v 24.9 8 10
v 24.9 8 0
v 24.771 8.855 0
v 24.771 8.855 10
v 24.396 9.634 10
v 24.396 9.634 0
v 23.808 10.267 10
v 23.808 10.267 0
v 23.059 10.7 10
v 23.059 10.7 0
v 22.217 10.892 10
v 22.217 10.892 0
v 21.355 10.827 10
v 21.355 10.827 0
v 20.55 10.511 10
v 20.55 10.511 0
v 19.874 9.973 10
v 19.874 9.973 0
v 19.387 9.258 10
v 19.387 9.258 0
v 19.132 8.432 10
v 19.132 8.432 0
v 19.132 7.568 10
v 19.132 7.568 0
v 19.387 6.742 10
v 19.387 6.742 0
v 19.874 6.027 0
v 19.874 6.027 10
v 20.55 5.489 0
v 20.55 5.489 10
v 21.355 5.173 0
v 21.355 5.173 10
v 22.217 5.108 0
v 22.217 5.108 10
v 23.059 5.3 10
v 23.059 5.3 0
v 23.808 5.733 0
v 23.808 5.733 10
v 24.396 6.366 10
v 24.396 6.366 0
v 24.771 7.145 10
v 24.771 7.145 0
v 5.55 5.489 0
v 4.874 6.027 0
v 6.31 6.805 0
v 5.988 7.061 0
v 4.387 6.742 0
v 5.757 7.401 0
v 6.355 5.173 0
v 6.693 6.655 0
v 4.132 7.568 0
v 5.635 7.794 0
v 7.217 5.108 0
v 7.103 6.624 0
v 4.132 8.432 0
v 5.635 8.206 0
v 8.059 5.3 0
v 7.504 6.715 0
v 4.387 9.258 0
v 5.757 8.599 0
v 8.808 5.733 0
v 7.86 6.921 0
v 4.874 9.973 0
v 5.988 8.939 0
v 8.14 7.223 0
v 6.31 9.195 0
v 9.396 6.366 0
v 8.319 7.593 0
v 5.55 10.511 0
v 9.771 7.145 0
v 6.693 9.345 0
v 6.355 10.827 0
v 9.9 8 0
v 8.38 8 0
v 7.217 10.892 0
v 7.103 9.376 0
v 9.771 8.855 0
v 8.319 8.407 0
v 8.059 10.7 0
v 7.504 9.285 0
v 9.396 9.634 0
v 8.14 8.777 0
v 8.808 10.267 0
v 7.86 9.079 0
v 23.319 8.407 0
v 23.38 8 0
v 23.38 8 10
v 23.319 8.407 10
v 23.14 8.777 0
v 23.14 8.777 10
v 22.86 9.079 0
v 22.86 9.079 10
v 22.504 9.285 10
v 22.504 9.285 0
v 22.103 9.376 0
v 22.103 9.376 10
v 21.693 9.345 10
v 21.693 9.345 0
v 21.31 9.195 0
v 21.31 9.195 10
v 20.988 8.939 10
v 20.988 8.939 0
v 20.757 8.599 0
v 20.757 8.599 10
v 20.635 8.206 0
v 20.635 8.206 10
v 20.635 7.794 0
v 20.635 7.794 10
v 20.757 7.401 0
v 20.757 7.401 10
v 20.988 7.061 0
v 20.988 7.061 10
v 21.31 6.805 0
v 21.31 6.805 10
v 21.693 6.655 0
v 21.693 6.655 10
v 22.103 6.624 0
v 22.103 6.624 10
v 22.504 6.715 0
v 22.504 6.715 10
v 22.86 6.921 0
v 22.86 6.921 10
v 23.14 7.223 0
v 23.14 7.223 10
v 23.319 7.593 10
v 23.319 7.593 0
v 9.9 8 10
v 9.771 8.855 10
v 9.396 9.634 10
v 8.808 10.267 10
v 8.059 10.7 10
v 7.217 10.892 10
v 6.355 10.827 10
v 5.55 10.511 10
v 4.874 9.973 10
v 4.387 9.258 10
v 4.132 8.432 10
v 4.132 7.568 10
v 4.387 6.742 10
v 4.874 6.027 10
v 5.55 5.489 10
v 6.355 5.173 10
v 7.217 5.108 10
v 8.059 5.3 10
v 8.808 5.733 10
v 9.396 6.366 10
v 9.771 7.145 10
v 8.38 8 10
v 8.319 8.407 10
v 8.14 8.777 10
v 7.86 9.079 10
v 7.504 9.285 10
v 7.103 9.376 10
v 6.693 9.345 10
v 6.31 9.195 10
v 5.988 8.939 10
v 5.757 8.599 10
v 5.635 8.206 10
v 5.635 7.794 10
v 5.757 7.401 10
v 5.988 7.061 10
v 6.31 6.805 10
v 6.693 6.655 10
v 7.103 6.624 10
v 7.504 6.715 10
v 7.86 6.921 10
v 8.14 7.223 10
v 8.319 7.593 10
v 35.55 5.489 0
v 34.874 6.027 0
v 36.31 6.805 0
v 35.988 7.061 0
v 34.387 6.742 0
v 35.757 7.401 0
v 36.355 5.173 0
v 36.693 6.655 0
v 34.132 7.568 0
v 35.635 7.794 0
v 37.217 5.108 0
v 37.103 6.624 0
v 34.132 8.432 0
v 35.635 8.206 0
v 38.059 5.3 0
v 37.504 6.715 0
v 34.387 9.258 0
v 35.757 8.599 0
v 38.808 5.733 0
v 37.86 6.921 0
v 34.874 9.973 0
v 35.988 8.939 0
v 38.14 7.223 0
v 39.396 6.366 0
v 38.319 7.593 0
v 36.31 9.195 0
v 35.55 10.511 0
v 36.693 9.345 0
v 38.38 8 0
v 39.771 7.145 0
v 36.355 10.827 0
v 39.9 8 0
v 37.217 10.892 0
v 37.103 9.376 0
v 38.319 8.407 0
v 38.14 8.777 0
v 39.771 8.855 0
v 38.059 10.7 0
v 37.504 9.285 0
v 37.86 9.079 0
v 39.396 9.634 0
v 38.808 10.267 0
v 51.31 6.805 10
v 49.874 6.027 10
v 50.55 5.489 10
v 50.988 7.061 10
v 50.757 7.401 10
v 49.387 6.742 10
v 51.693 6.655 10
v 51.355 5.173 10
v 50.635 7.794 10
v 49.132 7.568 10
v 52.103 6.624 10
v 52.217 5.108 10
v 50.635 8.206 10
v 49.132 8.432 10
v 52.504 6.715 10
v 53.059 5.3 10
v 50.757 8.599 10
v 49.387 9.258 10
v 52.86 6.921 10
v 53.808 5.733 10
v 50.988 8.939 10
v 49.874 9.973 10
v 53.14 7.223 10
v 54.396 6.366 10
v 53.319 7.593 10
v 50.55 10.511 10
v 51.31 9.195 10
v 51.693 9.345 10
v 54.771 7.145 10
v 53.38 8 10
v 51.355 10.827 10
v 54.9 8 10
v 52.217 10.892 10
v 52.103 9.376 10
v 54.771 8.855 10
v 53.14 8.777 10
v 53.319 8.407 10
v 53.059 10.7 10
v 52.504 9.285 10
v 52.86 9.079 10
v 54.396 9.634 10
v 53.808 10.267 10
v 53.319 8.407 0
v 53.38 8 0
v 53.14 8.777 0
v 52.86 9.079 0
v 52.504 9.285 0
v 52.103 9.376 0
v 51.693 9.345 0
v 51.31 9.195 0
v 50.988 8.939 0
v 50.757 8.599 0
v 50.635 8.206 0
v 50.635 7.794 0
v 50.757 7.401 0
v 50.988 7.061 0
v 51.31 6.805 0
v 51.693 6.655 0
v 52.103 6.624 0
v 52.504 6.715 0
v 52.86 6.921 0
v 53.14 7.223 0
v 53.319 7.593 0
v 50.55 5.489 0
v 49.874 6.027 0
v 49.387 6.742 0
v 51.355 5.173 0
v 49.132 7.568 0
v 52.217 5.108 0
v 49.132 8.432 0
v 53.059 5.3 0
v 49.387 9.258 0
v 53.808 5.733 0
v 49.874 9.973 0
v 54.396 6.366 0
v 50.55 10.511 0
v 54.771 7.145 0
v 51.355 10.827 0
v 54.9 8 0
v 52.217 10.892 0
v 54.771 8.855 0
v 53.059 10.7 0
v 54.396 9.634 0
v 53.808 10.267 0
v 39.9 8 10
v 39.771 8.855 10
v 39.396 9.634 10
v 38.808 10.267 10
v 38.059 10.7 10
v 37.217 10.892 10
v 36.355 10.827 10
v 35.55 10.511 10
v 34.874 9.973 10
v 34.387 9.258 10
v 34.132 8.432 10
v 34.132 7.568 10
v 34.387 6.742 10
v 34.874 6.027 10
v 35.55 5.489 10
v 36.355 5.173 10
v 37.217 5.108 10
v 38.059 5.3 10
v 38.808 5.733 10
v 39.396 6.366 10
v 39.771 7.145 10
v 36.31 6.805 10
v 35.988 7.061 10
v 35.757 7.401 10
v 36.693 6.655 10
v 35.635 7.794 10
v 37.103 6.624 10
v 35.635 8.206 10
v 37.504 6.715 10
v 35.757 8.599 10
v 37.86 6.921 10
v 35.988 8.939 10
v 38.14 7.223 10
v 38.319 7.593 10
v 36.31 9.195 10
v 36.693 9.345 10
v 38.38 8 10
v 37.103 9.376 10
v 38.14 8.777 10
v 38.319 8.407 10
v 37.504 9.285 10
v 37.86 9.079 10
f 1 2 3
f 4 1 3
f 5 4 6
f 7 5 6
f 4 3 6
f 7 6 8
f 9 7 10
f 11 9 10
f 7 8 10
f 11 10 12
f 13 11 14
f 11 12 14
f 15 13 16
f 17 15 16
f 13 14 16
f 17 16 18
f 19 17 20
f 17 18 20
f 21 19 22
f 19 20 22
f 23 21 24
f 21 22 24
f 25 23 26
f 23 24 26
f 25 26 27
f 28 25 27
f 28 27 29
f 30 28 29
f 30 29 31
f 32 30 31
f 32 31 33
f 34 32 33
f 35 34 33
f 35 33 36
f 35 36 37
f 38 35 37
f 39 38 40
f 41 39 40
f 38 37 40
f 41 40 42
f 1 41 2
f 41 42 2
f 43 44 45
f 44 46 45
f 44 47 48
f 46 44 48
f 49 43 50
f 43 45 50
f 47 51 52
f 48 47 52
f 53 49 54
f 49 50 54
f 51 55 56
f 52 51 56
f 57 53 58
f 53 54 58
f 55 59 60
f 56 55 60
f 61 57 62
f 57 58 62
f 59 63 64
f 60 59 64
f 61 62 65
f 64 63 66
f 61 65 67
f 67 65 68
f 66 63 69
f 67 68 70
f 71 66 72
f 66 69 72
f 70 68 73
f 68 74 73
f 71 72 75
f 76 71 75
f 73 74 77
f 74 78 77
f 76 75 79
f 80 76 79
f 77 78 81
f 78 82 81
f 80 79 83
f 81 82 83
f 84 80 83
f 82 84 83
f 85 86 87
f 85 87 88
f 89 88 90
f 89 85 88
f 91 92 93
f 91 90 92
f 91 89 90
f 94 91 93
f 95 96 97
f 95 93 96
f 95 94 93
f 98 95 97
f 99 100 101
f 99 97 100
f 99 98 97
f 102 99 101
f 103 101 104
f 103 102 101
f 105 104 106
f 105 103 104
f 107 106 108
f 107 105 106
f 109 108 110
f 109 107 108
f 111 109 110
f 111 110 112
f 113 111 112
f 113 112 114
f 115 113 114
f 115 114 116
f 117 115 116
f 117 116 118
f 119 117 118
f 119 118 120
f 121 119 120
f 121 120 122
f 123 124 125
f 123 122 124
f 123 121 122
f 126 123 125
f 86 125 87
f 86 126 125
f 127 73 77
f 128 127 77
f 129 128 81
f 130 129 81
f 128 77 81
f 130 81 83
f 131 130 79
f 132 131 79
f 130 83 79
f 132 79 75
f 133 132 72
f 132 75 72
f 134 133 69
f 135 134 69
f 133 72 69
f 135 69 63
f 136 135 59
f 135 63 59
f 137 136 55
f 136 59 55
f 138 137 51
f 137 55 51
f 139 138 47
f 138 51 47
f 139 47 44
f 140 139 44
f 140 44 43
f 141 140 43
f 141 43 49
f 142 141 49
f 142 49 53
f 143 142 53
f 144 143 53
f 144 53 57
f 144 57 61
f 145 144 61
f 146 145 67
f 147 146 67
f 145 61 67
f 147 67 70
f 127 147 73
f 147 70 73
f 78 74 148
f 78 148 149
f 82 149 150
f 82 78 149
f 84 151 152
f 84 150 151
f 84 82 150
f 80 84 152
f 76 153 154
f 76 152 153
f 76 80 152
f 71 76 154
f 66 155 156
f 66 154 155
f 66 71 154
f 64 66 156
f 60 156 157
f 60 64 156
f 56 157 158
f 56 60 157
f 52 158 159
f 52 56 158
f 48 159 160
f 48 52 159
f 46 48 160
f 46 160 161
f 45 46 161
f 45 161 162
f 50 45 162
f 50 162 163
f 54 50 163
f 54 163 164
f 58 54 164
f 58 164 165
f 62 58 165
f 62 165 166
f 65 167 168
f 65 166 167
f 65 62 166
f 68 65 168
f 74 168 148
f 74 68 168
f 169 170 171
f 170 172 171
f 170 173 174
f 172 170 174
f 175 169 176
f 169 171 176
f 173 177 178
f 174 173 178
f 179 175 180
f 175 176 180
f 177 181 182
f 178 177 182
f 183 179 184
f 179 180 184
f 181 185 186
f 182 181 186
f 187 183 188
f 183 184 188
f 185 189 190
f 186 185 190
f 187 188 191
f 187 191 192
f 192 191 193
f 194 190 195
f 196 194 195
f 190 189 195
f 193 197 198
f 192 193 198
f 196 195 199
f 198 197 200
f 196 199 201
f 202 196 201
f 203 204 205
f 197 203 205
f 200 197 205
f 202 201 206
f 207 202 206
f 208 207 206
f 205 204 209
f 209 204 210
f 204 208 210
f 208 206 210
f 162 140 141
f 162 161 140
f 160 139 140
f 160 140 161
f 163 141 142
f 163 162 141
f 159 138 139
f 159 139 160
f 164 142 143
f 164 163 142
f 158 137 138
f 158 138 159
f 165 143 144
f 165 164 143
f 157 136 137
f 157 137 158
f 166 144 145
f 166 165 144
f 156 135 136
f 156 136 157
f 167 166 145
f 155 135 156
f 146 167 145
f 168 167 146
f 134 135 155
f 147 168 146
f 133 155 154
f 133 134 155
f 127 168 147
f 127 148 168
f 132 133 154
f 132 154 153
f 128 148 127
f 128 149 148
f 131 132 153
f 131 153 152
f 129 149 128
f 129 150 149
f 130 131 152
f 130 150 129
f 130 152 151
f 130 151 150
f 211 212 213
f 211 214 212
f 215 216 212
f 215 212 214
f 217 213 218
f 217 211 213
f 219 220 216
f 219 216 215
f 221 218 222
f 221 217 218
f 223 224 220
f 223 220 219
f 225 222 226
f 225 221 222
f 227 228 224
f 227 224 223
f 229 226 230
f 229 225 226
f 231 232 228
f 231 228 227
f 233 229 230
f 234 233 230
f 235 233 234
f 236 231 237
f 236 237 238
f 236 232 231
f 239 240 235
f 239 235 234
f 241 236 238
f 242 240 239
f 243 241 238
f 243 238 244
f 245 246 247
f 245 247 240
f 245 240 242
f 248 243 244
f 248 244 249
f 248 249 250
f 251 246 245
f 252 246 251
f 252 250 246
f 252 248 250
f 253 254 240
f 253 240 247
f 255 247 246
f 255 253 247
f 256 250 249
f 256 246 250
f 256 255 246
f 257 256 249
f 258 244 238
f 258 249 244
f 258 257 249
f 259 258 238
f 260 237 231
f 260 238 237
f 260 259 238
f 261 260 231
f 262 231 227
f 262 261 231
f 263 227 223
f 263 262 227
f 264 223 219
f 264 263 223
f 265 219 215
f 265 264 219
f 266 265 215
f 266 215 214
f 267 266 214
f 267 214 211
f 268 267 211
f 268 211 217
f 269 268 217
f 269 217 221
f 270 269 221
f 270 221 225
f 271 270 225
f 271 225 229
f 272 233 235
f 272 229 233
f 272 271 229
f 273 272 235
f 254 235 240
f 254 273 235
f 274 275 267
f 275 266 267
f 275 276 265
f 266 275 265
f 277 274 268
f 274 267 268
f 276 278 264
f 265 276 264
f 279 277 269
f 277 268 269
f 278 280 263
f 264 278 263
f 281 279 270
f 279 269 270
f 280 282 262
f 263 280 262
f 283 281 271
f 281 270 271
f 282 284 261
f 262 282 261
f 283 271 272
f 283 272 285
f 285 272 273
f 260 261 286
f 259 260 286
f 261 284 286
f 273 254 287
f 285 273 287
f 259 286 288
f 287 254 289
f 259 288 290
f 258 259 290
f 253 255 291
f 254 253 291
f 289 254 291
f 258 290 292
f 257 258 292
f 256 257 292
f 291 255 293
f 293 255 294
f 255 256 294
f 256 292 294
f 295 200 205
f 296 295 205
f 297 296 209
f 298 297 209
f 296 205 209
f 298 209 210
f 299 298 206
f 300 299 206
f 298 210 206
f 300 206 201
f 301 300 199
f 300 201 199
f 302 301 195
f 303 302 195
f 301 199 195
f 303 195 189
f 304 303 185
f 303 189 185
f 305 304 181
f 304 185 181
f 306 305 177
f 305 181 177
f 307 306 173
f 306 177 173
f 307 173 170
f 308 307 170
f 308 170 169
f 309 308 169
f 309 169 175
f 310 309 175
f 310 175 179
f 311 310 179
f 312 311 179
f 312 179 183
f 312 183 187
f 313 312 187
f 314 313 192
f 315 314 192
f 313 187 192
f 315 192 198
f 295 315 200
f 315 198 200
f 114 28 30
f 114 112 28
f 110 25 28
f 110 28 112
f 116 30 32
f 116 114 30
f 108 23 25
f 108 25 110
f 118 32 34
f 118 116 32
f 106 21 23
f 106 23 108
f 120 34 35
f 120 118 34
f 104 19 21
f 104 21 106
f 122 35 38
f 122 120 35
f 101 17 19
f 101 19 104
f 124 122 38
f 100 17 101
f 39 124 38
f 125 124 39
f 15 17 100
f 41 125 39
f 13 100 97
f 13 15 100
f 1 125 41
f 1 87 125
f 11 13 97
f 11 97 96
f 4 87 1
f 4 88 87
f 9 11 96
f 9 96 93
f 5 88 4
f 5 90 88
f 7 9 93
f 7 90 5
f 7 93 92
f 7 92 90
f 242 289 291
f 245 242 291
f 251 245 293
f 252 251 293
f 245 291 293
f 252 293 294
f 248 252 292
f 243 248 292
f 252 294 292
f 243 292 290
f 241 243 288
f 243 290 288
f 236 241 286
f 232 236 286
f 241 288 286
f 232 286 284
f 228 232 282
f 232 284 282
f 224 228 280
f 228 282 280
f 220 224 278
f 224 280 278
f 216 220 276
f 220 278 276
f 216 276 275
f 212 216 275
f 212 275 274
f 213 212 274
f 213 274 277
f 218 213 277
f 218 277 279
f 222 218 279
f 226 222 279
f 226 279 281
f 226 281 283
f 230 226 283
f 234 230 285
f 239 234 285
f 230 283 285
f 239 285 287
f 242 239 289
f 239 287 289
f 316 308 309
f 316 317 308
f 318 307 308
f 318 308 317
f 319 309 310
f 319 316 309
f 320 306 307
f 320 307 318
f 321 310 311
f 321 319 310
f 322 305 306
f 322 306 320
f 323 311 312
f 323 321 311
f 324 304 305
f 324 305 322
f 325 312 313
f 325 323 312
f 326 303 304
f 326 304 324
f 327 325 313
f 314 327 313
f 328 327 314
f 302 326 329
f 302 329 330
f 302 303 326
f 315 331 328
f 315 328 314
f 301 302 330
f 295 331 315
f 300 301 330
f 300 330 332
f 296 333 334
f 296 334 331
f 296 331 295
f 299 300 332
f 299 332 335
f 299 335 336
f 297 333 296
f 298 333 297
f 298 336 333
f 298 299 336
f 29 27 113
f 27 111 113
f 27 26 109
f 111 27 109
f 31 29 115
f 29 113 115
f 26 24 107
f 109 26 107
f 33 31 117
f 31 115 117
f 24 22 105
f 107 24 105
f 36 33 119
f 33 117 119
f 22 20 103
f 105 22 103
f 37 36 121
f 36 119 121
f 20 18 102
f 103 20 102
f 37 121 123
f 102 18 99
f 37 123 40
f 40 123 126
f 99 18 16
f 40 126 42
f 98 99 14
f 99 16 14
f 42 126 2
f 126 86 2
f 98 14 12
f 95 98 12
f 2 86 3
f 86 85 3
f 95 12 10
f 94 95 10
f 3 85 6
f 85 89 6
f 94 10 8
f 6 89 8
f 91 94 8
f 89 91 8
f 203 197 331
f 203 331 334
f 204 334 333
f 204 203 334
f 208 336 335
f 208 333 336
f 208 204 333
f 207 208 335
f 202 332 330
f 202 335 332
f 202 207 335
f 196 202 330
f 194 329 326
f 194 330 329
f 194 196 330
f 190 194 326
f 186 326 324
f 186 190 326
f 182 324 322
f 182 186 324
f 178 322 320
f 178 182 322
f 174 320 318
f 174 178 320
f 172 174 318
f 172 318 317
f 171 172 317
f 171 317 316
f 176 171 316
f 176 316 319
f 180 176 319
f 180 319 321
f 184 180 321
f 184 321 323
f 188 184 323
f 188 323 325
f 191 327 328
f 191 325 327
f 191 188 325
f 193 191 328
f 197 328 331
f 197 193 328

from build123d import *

# Parameters (mm, degrees)
CYLINDER013_R     = 1.38
CYLINDER013_DEPTH = 15
CYLINDER014_R     = 1.38
CYLINDER014_DEPTH = 15
CYLINDER015_R     = 1.38
CYLINDER015_DEPTH = 15
CYLINDER012_R     = 1.38
CYLINDER012_DEPTH = 15
CYLINDER008_R     = 2.9
CYLINDER008_DEPTH = 10
CYLINDER009_R     = 2.9
CYLINDER009_DEPTH = 10
CYLINDER011_R     = 2.9
CYLINDER011_DEPTH = 10
CYLINDER010_R     = 2.9
CYLINDER010_DEPTH = 10


with BuildPart() as zylinder005:
    # Cylinder013 → Cylinder013 (new body)
    with BuildSketch(Plane(origin=(22, 8, -2), x_dir=(1, 0, 0), z_dir=(0, 0, 1))):
        Circle(CYLINDER013_R)
    extrude(amount=CYLINDER013_DEPTH)


with BuildPart() as zylinder006:
    # Cylinder014 → Cylinder014 (new body)
    with BuildSketch(Plane(origin=(37, 8, -2), x_dir=(1, 0, 0), z_dir=(0, 0, 1))):
        Circle(CYLINDER014_R)
    extrude(amount=CYLINDER014_DEPTH)


with BuildPart() as zylinder007:
    # Cylinder015 → Cylinder015 (new body)
    with BuildSketch(Plane(origin=(52, 8, -2), x_dir=(1, 0, 0), z_dir=(0, 0, 1))):
        Circle(CYLINDER015_R)
    extrude(amount=CYLINDER015_DEPTH)


with BuildPart() as fusion011:
    # Cylinder012 → Cylinder012 (new body)
    with BuildSketch(Plane(origin=(7, 8, -2), x_dir=(1, 0, 0), z_dir=(0, 0, 1))):
        Circle(CYLINDER012_R)
    extrude(amount=CYLINDER012_DEPTH)

    # Fusion011: union Zylinder005, Zylinder006, Zylinder007
    add(zylinder005.part)
    add(zylinder006.part)
    add(zylinder007.part)


with BuildPart() as zylinder009:
    # Cylinder008 → Cylinder008 (new body)
    with BuildSketch(Plane(origin=(7, 8, 0), x_dir=(1, 0, 0), z_dir=(0, 0, 1))):
        Circle(CYLINDER008_R)
    extrude(amount=CYLINDER008_DEPTH)


with BuildPart() as zylinder001:
    # Cylinder009 → Cylinder009 (new body)
    with BuildSketch(Plane(origin=(22, 8, 0), x_dir=(1, 0, 0), z_dir=(0, 0, 1))):
        Circle(CYLINDER009_R)
    extrude(amount=CYLINDER009_DEPTH)


with BuildPart() as zylinder003:
    # Cylinder011 → Cylinder011 (new body)
    with BuildSketch(Plane(origin=(52, 8, 0), x_dir=(1, 0, 0), z_dir=(0, 0, 1))):
        Circle(CYLINDER011_R)
    extrude(amount=CYLINDER011_DEPTH)


with BuildPart() as distanzen:
    # Cylinder010 → Cylinder010 (new body)
    with BuildSketch(Plane(origin=(37, 8, 0), x_dir=(1, 0, 0), z_dir=(0, 0, 1))):
        Circle(CYLINDER010_R)
    extrude(amount=CYLINDER010_DEPTH)

    # Fusion012: union Zylinder009, Zylinder001, Zylinder003
    add(zylinder009.part)
    add(zylinder001.part)
    add(zylinder003.part)

    # Cut005: cut Fusion011
    add(fusion011.part, mode=Mode.SUBTRACT)


solid = distanzen.part
